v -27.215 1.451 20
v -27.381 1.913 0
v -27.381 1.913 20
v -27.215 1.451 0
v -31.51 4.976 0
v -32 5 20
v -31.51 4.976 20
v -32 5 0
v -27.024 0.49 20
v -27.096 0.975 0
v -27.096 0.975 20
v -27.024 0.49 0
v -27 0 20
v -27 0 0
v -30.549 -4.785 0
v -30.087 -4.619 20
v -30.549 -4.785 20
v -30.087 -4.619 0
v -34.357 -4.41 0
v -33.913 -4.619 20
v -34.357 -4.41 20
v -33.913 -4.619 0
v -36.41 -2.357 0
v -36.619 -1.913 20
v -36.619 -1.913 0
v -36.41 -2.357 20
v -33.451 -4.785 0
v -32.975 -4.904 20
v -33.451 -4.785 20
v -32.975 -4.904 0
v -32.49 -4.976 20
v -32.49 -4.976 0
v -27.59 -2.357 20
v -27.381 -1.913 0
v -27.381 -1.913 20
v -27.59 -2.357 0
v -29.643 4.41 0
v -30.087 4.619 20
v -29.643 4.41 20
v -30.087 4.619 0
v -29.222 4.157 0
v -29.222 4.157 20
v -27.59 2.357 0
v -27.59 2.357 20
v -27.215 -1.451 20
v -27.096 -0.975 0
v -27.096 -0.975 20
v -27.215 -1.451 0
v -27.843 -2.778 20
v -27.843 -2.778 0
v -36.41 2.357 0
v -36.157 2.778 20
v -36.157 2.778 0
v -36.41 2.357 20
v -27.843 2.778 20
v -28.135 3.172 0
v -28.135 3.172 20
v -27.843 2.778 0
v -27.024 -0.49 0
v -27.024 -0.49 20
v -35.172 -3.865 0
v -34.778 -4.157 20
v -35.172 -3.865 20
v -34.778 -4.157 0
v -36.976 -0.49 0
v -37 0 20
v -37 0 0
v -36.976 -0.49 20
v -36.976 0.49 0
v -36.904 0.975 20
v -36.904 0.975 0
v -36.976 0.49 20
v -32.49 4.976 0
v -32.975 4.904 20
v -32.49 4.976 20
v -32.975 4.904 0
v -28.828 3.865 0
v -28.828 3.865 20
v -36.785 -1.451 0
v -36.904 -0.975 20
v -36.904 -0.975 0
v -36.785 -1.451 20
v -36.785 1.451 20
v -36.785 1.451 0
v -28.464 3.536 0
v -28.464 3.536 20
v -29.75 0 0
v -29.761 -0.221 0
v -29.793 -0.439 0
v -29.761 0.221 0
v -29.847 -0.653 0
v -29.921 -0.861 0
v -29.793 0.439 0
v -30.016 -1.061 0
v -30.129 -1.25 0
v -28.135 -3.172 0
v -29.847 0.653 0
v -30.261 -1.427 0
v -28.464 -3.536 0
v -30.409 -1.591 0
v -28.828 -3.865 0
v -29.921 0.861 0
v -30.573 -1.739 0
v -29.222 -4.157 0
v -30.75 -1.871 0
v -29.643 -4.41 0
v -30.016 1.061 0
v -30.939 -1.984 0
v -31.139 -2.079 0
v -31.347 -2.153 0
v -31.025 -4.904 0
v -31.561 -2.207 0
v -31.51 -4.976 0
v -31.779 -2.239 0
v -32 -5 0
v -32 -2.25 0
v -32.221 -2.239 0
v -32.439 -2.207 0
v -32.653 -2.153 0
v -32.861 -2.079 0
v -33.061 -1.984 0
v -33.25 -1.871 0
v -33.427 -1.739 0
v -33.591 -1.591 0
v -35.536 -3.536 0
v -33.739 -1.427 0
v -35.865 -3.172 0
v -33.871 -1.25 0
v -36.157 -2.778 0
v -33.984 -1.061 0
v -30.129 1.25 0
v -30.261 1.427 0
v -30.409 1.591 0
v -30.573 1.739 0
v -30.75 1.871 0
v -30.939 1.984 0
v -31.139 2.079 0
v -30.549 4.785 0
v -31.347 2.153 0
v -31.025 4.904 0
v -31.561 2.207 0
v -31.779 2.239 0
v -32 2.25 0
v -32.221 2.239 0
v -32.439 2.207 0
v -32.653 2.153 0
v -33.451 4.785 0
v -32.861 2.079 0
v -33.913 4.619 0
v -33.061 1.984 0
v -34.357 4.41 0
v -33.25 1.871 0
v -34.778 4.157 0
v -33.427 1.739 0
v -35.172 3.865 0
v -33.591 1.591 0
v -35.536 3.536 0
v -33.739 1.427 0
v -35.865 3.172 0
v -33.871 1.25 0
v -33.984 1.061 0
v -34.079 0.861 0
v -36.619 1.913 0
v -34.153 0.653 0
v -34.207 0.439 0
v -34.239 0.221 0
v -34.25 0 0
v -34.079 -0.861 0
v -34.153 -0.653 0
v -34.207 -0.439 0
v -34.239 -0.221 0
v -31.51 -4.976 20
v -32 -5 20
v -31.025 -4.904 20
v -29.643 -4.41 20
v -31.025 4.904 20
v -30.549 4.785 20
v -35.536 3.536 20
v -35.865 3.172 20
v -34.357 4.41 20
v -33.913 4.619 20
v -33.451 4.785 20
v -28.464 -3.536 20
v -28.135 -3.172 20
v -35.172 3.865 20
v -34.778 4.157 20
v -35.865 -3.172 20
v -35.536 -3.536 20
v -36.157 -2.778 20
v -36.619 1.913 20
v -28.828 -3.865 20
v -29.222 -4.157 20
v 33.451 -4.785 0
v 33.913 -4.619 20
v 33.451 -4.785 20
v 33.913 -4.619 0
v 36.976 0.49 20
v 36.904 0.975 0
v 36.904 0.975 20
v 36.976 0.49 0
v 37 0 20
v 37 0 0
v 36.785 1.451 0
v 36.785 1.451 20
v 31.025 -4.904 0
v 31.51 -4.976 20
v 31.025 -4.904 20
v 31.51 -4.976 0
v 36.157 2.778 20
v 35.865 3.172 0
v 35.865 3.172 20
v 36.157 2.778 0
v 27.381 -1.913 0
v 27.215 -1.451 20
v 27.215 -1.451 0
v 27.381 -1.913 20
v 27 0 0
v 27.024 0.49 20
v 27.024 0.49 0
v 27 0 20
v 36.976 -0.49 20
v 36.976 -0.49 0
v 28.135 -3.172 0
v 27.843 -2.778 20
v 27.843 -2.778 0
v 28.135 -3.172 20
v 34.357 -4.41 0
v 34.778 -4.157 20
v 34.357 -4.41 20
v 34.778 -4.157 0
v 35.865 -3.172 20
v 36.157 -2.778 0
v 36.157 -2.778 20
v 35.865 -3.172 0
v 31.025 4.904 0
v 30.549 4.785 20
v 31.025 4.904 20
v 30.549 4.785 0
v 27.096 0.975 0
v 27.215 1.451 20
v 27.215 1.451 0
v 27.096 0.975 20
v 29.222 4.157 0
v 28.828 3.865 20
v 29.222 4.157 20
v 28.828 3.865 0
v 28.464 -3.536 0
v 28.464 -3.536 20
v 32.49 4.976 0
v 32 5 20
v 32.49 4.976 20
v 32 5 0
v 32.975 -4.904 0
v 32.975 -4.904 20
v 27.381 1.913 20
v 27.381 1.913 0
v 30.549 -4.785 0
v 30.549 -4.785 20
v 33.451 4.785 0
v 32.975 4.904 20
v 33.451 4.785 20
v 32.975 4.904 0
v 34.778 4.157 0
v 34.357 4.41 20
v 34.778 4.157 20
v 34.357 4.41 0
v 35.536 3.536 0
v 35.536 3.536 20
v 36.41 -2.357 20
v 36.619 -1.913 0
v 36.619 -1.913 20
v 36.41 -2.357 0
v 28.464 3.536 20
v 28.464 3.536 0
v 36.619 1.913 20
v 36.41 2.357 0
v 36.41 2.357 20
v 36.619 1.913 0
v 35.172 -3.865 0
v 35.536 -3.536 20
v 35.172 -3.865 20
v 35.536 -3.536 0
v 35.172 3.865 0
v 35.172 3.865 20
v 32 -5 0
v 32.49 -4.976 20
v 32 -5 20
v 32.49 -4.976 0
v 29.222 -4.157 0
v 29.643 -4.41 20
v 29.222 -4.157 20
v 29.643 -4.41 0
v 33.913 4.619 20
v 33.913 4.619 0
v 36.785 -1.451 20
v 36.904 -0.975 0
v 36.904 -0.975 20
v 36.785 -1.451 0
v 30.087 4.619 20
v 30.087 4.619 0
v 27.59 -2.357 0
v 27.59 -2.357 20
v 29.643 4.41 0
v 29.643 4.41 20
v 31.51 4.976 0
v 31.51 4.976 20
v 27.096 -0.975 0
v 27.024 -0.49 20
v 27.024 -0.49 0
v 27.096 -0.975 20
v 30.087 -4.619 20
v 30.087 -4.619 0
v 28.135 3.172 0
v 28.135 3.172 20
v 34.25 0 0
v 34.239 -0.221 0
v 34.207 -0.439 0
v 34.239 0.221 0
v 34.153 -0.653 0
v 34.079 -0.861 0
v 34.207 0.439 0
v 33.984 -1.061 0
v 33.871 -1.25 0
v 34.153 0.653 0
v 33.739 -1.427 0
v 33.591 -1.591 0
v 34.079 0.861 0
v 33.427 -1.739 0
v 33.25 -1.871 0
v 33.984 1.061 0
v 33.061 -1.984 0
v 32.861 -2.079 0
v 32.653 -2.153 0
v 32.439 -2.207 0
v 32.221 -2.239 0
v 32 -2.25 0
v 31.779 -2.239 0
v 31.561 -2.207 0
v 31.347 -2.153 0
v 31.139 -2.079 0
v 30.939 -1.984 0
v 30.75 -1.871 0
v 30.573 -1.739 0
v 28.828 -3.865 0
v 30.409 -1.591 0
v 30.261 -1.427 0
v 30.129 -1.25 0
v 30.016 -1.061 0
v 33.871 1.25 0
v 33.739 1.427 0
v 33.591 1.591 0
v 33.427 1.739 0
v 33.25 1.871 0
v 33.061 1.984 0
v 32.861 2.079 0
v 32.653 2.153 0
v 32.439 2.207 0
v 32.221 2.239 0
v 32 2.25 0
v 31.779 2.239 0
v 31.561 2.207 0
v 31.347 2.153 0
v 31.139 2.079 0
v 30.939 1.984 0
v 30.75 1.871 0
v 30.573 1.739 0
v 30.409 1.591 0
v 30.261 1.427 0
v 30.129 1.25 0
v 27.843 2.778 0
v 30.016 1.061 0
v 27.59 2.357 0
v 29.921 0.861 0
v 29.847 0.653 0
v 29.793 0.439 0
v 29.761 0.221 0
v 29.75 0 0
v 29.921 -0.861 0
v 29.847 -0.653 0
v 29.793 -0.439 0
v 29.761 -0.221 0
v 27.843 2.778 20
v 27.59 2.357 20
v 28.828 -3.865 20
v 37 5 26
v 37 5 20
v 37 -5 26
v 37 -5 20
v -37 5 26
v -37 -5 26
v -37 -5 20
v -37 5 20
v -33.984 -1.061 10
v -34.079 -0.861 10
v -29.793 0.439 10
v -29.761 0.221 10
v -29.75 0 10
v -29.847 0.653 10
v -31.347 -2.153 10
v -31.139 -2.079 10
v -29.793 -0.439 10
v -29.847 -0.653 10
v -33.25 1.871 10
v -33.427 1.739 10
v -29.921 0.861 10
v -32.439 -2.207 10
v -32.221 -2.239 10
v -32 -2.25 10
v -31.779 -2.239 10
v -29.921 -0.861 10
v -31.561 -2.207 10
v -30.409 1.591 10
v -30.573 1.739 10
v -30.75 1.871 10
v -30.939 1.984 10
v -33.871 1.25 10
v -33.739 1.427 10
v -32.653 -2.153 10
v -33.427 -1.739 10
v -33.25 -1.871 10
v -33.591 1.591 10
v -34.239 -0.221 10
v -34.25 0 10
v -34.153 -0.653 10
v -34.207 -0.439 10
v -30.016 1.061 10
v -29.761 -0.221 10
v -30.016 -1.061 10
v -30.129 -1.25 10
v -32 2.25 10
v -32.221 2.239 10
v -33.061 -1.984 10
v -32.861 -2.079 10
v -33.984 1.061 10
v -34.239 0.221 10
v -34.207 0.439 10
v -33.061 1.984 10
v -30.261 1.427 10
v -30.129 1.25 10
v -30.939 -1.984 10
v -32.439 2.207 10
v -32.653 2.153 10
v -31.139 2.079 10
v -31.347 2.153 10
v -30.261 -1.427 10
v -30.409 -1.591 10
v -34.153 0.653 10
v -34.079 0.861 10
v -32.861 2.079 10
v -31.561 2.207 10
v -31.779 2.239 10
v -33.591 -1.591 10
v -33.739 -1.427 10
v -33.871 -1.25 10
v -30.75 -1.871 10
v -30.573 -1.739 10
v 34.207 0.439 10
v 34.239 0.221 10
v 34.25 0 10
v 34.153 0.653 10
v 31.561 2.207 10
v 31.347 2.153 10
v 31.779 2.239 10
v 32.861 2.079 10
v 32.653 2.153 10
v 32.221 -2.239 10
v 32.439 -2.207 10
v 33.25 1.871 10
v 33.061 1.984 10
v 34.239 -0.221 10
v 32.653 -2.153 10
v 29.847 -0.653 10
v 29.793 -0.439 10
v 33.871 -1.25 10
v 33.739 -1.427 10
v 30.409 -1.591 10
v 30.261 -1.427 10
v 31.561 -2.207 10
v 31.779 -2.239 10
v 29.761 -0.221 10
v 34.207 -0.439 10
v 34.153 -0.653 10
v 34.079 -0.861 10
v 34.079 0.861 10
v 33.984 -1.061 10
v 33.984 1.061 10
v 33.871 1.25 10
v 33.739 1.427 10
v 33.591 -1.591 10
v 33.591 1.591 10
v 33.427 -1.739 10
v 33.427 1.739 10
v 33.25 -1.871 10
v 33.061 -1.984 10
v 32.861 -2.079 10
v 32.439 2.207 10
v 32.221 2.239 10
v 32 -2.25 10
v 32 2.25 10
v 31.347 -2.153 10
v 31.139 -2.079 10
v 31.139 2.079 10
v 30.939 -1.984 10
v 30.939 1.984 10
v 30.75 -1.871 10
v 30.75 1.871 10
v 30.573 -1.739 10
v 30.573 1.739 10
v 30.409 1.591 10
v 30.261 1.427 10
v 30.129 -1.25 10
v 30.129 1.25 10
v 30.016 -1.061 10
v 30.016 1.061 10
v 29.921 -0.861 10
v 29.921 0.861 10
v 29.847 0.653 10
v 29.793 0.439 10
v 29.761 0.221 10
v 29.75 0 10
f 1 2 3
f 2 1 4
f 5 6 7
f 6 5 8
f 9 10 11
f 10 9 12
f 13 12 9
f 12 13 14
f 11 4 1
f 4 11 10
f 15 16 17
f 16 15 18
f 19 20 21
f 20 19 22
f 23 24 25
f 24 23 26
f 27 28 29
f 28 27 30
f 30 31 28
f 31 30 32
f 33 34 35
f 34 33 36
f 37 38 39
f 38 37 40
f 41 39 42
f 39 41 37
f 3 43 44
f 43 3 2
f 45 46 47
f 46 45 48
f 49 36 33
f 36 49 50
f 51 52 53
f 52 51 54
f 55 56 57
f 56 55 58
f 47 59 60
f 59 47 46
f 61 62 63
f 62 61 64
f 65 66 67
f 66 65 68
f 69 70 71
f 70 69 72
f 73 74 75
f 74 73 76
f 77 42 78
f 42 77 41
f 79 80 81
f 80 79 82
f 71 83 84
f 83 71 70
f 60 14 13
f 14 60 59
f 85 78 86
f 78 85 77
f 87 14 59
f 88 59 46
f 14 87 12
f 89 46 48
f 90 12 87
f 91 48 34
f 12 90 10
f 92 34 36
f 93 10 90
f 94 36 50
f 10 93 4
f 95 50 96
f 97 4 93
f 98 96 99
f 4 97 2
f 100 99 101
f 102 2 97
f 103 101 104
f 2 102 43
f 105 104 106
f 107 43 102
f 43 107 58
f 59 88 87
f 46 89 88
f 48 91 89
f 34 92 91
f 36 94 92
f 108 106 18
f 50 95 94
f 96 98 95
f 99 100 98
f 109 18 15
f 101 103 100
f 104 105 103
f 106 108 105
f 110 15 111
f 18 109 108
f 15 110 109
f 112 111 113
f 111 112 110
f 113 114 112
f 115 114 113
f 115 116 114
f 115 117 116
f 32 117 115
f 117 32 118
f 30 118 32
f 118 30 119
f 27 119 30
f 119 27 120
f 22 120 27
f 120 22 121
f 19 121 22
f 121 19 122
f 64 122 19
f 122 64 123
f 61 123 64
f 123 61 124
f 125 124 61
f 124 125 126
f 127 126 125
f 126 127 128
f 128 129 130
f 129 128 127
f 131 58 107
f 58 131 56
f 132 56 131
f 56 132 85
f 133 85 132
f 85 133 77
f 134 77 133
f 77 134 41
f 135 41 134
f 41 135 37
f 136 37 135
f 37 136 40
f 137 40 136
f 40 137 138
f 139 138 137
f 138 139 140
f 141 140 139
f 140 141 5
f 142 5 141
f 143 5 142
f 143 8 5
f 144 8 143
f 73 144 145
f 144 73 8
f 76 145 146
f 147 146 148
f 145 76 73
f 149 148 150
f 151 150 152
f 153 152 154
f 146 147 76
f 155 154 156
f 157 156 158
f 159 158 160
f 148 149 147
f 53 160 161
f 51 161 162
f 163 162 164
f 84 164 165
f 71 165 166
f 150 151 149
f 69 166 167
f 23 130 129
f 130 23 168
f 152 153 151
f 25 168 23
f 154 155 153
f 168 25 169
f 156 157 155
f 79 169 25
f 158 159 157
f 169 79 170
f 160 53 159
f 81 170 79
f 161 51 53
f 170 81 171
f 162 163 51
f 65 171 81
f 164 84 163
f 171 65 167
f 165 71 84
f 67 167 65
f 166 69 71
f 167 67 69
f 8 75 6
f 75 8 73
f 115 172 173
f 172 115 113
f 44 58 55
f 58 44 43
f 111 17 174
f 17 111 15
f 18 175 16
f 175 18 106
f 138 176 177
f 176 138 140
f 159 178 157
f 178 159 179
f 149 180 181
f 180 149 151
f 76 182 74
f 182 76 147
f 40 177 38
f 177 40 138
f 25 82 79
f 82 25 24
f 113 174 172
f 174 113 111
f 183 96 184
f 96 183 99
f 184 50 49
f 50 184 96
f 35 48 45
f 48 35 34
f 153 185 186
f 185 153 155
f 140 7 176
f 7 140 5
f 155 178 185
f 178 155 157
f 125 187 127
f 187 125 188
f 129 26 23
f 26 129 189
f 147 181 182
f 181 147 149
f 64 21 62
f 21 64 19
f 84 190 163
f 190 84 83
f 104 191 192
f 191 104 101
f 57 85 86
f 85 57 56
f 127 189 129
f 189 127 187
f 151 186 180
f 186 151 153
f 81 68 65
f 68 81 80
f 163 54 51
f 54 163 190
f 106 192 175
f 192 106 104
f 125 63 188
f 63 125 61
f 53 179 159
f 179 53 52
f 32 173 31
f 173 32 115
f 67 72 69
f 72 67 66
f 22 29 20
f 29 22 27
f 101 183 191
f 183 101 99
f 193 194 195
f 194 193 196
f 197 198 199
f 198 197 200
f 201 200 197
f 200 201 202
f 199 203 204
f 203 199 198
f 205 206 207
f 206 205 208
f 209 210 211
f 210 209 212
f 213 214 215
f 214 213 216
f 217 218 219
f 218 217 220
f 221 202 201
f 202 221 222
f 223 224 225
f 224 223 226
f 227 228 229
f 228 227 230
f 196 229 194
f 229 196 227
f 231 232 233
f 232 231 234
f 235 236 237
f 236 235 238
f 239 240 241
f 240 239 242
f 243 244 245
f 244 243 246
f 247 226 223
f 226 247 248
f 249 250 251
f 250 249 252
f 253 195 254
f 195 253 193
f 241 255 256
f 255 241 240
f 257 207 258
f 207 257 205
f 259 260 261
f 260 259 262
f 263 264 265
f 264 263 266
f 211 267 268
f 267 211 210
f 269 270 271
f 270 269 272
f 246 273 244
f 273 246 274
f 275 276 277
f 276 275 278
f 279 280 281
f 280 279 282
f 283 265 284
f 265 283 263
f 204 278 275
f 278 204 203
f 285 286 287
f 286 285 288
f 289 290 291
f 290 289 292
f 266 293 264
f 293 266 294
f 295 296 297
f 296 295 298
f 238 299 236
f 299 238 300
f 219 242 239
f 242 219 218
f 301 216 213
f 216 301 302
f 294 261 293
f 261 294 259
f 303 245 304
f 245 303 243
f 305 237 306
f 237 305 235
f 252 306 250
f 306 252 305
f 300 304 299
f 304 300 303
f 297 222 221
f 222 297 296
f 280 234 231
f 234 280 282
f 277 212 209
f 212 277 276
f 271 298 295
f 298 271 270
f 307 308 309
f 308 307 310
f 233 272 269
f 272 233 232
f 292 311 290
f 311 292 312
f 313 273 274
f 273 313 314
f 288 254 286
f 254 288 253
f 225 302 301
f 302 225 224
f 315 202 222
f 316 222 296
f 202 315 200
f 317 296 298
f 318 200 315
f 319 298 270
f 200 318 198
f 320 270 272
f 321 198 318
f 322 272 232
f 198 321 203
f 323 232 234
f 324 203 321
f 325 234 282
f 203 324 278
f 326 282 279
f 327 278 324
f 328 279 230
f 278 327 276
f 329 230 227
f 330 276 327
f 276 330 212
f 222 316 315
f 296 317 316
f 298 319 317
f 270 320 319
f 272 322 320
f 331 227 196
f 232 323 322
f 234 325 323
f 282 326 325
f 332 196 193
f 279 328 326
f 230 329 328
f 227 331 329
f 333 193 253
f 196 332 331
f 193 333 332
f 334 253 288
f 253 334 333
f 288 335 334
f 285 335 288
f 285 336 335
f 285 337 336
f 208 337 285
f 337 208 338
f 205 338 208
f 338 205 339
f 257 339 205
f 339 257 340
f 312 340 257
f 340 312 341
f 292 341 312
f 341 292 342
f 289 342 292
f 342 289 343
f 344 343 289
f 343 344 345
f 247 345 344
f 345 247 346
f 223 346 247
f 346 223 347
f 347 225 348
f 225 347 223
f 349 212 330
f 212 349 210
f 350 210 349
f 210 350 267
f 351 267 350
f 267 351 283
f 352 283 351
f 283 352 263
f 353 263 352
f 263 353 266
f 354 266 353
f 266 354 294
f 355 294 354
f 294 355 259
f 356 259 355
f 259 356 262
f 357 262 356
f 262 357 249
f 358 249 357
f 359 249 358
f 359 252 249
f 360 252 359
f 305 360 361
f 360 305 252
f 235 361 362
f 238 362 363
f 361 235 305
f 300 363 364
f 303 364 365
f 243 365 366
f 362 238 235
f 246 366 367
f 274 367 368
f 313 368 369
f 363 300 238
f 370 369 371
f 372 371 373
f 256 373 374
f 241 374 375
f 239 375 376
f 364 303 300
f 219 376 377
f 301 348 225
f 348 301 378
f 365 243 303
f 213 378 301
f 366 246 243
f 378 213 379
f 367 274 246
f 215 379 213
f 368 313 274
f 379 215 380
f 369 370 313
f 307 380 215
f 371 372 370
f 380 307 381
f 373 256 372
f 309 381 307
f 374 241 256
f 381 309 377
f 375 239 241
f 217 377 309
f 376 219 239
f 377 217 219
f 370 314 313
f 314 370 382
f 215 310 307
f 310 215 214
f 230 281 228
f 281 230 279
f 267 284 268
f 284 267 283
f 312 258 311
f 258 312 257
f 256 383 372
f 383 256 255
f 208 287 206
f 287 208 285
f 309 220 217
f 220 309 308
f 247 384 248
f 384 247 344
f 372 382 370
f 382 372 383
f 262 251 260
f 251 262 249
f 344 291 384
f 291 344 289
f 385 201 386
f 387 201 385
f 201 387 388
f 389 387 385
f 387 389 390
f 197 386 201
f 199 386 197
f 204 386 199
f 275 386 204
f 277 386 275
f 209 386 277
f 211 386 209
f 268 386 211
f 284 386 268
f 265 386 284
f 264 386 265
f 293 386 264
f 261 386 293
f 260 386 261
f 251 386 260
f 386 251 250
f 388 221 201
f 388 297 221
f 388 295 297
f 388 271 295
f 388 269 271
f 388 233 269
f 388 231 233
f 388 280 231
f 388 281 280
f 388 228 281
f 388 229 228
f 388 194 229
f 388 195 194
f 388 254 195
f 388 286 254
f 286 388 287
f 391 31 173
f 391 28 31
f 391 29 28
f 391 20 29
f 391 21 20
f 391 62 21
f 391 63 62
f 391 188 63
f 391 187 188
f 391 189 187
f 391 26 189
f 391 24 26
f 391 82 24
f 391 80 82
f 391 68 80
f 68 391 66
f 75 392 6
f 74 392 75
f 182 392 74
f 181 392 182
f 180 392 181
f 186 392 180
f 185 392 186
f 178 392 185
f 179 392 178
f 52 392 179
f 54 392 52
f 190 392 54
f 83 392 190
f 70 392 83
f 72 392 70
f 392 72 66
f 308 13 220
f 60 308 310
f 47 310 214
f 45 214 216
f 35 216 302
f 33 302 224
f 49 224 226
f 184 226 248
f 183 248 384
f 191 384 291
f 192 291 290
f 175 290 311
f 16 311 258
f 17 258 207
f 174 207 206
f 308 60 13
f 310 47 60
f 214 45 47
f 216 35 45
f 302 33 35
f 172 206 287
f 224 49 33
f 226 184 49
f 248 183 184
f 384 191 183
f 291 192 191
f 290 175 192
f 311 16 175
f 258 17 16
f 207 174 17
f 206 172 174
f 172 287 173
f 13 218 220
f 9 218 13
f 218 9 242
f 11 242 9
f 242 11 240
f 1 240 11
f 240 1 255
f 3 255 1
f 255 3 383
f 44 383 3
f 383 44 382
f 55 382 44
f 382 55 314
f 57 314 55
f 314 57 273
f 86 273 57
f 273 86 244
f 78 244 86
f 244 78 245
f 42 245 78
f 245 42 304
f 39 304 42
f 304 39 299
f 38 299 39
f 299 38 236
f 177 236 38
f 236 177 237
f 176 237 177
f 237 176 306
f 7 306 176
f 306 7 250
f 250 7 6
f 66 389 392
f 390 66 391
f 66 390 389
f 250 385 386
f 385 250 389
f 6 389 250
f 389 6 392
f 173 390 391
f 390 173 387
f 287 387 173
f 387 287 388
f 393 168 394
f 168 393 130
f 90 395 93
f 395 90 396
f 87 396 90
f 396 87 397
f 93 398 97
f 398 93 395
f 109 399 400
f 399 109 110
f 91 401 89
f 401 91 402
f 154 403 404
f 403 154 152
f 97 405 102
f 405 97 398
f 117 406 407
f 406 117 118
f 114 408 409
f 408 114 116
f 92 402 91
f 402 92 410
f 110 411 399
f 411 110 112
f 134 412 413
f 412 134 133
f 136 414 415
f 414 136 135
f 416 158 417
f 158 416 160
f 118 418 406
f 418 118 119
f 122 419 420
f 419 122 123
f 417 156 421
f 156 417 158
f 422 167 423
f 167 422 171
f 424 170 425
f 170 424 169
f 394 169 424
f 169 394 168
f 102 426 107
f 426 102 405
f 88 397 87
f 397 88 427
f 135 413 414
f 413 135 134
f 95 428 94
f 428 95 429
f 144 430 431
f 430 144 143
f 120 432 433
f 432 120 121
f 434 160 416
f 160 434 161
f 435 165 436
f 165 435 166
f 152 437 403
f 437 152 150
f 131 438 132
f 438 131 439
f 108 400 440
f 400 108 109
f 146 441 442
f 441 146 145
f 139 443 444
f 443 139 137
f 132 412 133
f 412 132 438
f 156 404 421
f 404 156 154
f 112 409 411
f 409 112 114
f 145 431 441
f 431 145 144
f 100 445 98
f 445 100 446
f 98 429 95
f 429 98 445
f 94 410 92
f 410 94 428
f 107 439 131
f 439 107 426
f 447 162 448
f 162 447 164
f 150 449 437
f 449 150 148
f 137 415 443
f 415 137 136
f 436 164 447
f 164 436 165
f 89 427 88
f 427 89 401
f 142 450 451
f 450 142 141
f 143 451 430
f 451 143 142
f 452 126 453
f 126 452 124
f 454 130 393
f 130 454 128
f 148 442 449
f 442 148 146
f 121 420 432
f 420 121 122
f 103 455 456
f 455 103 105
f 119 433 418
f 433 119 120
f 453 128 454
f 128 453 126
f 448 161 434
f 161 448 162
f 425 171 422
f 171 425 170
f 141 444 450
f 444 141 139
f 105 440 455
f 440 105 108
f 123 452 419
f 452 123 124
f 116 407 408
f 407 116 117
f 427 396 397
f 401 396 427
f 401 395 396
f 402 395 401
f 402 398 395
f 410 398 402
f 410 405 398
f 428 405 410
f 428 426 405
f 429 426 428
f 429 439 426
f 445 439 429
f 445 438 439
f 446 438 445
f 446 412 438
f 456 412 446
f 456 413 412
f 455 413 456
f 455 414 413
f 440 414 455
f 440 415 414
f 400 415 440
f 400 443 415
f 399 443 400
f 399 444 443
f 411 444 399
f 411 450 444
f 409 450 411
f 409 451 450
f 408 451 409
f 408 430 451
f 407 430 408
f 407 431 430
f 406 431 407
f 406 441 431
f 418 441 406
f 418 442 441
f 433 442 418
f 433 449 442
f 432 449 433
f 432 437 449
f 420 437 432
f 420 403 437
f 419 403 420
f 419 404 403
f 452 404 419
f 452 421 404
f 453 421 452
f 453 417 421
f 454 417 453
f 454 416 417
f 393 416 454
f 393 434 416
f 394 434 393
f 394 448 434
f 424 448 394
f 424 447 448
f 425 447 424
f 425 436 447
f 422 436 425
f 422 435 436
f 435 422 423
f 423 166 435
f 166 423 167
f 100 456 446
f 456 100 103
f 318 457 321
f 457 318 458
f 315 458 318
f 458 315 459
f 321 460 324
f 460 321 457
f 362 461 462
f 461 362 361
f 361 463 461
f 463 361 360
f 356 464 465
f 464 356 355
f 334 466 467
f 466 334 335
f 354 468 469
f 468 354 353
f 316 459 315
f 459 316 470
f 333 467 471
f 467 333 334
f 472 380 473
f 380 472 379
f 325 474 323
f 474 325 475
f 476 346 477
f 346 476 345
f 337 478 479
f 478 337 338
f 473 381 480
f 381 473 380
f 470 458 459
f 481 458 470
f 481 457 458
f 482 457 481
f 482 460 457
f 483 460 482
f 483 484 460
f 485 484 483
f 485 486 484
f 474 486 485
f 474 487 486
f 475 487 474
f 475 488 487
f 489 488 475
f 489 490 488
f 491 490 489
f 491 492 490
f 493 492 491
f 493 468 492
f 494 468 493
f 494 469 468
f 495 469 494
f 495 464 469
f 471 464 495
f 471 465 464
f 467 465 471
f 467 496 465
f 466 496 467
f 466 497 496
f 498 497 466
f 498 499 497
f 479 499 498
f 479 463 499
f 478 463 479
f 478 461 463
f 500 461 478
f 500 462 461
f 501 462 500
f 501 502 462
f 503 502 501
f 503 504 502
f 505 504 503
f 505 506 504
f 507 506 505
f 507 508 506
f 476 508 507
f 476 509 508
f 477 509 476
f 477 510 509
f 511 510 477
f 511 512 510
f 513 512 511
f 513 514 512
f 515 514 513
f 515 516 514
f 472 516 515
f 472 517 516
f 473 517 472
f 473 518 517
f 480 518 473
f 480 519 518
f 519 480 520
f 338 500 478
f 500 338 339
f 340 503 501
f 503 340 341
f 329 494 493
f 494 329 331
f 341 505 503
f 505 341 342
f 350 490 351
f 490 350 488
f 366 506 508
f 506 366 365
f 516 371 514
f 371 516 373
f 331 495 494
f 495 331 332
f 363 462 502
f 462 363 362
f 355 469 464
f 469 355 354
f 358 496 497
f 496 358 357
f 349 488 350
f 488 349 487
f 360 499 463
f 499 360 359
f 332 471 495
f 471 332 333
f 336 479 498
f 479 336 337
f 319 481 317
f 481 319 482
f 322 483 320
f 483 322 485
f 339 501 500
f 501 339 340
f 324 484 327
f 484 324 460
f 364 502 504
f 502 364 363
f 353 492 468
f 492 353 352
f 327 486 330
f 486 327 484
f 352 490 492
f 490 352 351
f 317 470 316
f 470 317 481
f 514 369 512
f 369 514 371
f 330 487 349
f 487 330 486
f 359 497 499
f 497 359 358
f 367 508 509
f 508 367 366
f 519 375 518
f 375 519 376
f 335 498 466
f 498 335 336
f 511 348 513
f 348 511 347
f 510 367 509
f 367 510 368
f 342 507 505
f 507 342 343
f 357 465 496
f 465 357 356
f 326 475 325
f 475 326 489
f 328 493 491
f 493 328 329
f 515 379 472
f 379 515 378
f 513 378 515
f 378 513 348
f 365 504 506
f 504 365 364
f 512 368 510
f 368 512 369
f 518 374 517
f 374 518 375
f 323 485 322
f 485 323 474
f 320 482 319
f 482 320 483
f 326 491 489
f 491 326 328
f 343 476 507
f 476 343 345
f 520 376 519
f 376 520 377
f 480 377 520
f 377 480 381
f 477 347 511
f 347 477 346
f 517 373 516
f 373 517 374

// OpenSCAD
// Cabinet door pull handle
// Print orientation: posts on the bed (z = 0), bar on top (z = 20..26)

$fn = 64;

// ---- Posts ----
post_d       = 10;    // post diameter
post_h       = 20;    // post height (z = 0 to 20)
post_spacing = 64;    // centre-to-centre distance (axes at x = -32 and x = 32)

// ---- Bar ----
bar_len = 74;         // bar length along X
bar_w   = 10;         // bar width along Y
bar_t   = 6;          // bar thickness along Z (z = 20 to 26)

// ---- Screw holes ----
hole_d     = 4.5;     // screw hole diameter
hole_depth = 10;      // depth from bottom face up the post axis

// ---- Misc ----
eps     = 0.5;        // cutter overshoot past cut faces
overlap = 0.01;       // small overlap so posts fuse with the bar

difference() {
    union() {
        // Posts
        for (sx = [-1, 1])
            translate([sx * post_spacing / 2, 0, 0])
                cylinder(d = post_d, h = post_h + overlap);

        // Bar
        translate([-bar_len / 2, -bar_w / 2, post_h])
            cube([bar_len, bar_w, bar_t]);
    }

    // Screw holes up each post axis from the bottom face
    for (sx = [-1, 1])
        translate([sx * post_spacing / 2, 0, -eps])
            cylinder(d = hole_d, h = hole_depth + eps);
}
